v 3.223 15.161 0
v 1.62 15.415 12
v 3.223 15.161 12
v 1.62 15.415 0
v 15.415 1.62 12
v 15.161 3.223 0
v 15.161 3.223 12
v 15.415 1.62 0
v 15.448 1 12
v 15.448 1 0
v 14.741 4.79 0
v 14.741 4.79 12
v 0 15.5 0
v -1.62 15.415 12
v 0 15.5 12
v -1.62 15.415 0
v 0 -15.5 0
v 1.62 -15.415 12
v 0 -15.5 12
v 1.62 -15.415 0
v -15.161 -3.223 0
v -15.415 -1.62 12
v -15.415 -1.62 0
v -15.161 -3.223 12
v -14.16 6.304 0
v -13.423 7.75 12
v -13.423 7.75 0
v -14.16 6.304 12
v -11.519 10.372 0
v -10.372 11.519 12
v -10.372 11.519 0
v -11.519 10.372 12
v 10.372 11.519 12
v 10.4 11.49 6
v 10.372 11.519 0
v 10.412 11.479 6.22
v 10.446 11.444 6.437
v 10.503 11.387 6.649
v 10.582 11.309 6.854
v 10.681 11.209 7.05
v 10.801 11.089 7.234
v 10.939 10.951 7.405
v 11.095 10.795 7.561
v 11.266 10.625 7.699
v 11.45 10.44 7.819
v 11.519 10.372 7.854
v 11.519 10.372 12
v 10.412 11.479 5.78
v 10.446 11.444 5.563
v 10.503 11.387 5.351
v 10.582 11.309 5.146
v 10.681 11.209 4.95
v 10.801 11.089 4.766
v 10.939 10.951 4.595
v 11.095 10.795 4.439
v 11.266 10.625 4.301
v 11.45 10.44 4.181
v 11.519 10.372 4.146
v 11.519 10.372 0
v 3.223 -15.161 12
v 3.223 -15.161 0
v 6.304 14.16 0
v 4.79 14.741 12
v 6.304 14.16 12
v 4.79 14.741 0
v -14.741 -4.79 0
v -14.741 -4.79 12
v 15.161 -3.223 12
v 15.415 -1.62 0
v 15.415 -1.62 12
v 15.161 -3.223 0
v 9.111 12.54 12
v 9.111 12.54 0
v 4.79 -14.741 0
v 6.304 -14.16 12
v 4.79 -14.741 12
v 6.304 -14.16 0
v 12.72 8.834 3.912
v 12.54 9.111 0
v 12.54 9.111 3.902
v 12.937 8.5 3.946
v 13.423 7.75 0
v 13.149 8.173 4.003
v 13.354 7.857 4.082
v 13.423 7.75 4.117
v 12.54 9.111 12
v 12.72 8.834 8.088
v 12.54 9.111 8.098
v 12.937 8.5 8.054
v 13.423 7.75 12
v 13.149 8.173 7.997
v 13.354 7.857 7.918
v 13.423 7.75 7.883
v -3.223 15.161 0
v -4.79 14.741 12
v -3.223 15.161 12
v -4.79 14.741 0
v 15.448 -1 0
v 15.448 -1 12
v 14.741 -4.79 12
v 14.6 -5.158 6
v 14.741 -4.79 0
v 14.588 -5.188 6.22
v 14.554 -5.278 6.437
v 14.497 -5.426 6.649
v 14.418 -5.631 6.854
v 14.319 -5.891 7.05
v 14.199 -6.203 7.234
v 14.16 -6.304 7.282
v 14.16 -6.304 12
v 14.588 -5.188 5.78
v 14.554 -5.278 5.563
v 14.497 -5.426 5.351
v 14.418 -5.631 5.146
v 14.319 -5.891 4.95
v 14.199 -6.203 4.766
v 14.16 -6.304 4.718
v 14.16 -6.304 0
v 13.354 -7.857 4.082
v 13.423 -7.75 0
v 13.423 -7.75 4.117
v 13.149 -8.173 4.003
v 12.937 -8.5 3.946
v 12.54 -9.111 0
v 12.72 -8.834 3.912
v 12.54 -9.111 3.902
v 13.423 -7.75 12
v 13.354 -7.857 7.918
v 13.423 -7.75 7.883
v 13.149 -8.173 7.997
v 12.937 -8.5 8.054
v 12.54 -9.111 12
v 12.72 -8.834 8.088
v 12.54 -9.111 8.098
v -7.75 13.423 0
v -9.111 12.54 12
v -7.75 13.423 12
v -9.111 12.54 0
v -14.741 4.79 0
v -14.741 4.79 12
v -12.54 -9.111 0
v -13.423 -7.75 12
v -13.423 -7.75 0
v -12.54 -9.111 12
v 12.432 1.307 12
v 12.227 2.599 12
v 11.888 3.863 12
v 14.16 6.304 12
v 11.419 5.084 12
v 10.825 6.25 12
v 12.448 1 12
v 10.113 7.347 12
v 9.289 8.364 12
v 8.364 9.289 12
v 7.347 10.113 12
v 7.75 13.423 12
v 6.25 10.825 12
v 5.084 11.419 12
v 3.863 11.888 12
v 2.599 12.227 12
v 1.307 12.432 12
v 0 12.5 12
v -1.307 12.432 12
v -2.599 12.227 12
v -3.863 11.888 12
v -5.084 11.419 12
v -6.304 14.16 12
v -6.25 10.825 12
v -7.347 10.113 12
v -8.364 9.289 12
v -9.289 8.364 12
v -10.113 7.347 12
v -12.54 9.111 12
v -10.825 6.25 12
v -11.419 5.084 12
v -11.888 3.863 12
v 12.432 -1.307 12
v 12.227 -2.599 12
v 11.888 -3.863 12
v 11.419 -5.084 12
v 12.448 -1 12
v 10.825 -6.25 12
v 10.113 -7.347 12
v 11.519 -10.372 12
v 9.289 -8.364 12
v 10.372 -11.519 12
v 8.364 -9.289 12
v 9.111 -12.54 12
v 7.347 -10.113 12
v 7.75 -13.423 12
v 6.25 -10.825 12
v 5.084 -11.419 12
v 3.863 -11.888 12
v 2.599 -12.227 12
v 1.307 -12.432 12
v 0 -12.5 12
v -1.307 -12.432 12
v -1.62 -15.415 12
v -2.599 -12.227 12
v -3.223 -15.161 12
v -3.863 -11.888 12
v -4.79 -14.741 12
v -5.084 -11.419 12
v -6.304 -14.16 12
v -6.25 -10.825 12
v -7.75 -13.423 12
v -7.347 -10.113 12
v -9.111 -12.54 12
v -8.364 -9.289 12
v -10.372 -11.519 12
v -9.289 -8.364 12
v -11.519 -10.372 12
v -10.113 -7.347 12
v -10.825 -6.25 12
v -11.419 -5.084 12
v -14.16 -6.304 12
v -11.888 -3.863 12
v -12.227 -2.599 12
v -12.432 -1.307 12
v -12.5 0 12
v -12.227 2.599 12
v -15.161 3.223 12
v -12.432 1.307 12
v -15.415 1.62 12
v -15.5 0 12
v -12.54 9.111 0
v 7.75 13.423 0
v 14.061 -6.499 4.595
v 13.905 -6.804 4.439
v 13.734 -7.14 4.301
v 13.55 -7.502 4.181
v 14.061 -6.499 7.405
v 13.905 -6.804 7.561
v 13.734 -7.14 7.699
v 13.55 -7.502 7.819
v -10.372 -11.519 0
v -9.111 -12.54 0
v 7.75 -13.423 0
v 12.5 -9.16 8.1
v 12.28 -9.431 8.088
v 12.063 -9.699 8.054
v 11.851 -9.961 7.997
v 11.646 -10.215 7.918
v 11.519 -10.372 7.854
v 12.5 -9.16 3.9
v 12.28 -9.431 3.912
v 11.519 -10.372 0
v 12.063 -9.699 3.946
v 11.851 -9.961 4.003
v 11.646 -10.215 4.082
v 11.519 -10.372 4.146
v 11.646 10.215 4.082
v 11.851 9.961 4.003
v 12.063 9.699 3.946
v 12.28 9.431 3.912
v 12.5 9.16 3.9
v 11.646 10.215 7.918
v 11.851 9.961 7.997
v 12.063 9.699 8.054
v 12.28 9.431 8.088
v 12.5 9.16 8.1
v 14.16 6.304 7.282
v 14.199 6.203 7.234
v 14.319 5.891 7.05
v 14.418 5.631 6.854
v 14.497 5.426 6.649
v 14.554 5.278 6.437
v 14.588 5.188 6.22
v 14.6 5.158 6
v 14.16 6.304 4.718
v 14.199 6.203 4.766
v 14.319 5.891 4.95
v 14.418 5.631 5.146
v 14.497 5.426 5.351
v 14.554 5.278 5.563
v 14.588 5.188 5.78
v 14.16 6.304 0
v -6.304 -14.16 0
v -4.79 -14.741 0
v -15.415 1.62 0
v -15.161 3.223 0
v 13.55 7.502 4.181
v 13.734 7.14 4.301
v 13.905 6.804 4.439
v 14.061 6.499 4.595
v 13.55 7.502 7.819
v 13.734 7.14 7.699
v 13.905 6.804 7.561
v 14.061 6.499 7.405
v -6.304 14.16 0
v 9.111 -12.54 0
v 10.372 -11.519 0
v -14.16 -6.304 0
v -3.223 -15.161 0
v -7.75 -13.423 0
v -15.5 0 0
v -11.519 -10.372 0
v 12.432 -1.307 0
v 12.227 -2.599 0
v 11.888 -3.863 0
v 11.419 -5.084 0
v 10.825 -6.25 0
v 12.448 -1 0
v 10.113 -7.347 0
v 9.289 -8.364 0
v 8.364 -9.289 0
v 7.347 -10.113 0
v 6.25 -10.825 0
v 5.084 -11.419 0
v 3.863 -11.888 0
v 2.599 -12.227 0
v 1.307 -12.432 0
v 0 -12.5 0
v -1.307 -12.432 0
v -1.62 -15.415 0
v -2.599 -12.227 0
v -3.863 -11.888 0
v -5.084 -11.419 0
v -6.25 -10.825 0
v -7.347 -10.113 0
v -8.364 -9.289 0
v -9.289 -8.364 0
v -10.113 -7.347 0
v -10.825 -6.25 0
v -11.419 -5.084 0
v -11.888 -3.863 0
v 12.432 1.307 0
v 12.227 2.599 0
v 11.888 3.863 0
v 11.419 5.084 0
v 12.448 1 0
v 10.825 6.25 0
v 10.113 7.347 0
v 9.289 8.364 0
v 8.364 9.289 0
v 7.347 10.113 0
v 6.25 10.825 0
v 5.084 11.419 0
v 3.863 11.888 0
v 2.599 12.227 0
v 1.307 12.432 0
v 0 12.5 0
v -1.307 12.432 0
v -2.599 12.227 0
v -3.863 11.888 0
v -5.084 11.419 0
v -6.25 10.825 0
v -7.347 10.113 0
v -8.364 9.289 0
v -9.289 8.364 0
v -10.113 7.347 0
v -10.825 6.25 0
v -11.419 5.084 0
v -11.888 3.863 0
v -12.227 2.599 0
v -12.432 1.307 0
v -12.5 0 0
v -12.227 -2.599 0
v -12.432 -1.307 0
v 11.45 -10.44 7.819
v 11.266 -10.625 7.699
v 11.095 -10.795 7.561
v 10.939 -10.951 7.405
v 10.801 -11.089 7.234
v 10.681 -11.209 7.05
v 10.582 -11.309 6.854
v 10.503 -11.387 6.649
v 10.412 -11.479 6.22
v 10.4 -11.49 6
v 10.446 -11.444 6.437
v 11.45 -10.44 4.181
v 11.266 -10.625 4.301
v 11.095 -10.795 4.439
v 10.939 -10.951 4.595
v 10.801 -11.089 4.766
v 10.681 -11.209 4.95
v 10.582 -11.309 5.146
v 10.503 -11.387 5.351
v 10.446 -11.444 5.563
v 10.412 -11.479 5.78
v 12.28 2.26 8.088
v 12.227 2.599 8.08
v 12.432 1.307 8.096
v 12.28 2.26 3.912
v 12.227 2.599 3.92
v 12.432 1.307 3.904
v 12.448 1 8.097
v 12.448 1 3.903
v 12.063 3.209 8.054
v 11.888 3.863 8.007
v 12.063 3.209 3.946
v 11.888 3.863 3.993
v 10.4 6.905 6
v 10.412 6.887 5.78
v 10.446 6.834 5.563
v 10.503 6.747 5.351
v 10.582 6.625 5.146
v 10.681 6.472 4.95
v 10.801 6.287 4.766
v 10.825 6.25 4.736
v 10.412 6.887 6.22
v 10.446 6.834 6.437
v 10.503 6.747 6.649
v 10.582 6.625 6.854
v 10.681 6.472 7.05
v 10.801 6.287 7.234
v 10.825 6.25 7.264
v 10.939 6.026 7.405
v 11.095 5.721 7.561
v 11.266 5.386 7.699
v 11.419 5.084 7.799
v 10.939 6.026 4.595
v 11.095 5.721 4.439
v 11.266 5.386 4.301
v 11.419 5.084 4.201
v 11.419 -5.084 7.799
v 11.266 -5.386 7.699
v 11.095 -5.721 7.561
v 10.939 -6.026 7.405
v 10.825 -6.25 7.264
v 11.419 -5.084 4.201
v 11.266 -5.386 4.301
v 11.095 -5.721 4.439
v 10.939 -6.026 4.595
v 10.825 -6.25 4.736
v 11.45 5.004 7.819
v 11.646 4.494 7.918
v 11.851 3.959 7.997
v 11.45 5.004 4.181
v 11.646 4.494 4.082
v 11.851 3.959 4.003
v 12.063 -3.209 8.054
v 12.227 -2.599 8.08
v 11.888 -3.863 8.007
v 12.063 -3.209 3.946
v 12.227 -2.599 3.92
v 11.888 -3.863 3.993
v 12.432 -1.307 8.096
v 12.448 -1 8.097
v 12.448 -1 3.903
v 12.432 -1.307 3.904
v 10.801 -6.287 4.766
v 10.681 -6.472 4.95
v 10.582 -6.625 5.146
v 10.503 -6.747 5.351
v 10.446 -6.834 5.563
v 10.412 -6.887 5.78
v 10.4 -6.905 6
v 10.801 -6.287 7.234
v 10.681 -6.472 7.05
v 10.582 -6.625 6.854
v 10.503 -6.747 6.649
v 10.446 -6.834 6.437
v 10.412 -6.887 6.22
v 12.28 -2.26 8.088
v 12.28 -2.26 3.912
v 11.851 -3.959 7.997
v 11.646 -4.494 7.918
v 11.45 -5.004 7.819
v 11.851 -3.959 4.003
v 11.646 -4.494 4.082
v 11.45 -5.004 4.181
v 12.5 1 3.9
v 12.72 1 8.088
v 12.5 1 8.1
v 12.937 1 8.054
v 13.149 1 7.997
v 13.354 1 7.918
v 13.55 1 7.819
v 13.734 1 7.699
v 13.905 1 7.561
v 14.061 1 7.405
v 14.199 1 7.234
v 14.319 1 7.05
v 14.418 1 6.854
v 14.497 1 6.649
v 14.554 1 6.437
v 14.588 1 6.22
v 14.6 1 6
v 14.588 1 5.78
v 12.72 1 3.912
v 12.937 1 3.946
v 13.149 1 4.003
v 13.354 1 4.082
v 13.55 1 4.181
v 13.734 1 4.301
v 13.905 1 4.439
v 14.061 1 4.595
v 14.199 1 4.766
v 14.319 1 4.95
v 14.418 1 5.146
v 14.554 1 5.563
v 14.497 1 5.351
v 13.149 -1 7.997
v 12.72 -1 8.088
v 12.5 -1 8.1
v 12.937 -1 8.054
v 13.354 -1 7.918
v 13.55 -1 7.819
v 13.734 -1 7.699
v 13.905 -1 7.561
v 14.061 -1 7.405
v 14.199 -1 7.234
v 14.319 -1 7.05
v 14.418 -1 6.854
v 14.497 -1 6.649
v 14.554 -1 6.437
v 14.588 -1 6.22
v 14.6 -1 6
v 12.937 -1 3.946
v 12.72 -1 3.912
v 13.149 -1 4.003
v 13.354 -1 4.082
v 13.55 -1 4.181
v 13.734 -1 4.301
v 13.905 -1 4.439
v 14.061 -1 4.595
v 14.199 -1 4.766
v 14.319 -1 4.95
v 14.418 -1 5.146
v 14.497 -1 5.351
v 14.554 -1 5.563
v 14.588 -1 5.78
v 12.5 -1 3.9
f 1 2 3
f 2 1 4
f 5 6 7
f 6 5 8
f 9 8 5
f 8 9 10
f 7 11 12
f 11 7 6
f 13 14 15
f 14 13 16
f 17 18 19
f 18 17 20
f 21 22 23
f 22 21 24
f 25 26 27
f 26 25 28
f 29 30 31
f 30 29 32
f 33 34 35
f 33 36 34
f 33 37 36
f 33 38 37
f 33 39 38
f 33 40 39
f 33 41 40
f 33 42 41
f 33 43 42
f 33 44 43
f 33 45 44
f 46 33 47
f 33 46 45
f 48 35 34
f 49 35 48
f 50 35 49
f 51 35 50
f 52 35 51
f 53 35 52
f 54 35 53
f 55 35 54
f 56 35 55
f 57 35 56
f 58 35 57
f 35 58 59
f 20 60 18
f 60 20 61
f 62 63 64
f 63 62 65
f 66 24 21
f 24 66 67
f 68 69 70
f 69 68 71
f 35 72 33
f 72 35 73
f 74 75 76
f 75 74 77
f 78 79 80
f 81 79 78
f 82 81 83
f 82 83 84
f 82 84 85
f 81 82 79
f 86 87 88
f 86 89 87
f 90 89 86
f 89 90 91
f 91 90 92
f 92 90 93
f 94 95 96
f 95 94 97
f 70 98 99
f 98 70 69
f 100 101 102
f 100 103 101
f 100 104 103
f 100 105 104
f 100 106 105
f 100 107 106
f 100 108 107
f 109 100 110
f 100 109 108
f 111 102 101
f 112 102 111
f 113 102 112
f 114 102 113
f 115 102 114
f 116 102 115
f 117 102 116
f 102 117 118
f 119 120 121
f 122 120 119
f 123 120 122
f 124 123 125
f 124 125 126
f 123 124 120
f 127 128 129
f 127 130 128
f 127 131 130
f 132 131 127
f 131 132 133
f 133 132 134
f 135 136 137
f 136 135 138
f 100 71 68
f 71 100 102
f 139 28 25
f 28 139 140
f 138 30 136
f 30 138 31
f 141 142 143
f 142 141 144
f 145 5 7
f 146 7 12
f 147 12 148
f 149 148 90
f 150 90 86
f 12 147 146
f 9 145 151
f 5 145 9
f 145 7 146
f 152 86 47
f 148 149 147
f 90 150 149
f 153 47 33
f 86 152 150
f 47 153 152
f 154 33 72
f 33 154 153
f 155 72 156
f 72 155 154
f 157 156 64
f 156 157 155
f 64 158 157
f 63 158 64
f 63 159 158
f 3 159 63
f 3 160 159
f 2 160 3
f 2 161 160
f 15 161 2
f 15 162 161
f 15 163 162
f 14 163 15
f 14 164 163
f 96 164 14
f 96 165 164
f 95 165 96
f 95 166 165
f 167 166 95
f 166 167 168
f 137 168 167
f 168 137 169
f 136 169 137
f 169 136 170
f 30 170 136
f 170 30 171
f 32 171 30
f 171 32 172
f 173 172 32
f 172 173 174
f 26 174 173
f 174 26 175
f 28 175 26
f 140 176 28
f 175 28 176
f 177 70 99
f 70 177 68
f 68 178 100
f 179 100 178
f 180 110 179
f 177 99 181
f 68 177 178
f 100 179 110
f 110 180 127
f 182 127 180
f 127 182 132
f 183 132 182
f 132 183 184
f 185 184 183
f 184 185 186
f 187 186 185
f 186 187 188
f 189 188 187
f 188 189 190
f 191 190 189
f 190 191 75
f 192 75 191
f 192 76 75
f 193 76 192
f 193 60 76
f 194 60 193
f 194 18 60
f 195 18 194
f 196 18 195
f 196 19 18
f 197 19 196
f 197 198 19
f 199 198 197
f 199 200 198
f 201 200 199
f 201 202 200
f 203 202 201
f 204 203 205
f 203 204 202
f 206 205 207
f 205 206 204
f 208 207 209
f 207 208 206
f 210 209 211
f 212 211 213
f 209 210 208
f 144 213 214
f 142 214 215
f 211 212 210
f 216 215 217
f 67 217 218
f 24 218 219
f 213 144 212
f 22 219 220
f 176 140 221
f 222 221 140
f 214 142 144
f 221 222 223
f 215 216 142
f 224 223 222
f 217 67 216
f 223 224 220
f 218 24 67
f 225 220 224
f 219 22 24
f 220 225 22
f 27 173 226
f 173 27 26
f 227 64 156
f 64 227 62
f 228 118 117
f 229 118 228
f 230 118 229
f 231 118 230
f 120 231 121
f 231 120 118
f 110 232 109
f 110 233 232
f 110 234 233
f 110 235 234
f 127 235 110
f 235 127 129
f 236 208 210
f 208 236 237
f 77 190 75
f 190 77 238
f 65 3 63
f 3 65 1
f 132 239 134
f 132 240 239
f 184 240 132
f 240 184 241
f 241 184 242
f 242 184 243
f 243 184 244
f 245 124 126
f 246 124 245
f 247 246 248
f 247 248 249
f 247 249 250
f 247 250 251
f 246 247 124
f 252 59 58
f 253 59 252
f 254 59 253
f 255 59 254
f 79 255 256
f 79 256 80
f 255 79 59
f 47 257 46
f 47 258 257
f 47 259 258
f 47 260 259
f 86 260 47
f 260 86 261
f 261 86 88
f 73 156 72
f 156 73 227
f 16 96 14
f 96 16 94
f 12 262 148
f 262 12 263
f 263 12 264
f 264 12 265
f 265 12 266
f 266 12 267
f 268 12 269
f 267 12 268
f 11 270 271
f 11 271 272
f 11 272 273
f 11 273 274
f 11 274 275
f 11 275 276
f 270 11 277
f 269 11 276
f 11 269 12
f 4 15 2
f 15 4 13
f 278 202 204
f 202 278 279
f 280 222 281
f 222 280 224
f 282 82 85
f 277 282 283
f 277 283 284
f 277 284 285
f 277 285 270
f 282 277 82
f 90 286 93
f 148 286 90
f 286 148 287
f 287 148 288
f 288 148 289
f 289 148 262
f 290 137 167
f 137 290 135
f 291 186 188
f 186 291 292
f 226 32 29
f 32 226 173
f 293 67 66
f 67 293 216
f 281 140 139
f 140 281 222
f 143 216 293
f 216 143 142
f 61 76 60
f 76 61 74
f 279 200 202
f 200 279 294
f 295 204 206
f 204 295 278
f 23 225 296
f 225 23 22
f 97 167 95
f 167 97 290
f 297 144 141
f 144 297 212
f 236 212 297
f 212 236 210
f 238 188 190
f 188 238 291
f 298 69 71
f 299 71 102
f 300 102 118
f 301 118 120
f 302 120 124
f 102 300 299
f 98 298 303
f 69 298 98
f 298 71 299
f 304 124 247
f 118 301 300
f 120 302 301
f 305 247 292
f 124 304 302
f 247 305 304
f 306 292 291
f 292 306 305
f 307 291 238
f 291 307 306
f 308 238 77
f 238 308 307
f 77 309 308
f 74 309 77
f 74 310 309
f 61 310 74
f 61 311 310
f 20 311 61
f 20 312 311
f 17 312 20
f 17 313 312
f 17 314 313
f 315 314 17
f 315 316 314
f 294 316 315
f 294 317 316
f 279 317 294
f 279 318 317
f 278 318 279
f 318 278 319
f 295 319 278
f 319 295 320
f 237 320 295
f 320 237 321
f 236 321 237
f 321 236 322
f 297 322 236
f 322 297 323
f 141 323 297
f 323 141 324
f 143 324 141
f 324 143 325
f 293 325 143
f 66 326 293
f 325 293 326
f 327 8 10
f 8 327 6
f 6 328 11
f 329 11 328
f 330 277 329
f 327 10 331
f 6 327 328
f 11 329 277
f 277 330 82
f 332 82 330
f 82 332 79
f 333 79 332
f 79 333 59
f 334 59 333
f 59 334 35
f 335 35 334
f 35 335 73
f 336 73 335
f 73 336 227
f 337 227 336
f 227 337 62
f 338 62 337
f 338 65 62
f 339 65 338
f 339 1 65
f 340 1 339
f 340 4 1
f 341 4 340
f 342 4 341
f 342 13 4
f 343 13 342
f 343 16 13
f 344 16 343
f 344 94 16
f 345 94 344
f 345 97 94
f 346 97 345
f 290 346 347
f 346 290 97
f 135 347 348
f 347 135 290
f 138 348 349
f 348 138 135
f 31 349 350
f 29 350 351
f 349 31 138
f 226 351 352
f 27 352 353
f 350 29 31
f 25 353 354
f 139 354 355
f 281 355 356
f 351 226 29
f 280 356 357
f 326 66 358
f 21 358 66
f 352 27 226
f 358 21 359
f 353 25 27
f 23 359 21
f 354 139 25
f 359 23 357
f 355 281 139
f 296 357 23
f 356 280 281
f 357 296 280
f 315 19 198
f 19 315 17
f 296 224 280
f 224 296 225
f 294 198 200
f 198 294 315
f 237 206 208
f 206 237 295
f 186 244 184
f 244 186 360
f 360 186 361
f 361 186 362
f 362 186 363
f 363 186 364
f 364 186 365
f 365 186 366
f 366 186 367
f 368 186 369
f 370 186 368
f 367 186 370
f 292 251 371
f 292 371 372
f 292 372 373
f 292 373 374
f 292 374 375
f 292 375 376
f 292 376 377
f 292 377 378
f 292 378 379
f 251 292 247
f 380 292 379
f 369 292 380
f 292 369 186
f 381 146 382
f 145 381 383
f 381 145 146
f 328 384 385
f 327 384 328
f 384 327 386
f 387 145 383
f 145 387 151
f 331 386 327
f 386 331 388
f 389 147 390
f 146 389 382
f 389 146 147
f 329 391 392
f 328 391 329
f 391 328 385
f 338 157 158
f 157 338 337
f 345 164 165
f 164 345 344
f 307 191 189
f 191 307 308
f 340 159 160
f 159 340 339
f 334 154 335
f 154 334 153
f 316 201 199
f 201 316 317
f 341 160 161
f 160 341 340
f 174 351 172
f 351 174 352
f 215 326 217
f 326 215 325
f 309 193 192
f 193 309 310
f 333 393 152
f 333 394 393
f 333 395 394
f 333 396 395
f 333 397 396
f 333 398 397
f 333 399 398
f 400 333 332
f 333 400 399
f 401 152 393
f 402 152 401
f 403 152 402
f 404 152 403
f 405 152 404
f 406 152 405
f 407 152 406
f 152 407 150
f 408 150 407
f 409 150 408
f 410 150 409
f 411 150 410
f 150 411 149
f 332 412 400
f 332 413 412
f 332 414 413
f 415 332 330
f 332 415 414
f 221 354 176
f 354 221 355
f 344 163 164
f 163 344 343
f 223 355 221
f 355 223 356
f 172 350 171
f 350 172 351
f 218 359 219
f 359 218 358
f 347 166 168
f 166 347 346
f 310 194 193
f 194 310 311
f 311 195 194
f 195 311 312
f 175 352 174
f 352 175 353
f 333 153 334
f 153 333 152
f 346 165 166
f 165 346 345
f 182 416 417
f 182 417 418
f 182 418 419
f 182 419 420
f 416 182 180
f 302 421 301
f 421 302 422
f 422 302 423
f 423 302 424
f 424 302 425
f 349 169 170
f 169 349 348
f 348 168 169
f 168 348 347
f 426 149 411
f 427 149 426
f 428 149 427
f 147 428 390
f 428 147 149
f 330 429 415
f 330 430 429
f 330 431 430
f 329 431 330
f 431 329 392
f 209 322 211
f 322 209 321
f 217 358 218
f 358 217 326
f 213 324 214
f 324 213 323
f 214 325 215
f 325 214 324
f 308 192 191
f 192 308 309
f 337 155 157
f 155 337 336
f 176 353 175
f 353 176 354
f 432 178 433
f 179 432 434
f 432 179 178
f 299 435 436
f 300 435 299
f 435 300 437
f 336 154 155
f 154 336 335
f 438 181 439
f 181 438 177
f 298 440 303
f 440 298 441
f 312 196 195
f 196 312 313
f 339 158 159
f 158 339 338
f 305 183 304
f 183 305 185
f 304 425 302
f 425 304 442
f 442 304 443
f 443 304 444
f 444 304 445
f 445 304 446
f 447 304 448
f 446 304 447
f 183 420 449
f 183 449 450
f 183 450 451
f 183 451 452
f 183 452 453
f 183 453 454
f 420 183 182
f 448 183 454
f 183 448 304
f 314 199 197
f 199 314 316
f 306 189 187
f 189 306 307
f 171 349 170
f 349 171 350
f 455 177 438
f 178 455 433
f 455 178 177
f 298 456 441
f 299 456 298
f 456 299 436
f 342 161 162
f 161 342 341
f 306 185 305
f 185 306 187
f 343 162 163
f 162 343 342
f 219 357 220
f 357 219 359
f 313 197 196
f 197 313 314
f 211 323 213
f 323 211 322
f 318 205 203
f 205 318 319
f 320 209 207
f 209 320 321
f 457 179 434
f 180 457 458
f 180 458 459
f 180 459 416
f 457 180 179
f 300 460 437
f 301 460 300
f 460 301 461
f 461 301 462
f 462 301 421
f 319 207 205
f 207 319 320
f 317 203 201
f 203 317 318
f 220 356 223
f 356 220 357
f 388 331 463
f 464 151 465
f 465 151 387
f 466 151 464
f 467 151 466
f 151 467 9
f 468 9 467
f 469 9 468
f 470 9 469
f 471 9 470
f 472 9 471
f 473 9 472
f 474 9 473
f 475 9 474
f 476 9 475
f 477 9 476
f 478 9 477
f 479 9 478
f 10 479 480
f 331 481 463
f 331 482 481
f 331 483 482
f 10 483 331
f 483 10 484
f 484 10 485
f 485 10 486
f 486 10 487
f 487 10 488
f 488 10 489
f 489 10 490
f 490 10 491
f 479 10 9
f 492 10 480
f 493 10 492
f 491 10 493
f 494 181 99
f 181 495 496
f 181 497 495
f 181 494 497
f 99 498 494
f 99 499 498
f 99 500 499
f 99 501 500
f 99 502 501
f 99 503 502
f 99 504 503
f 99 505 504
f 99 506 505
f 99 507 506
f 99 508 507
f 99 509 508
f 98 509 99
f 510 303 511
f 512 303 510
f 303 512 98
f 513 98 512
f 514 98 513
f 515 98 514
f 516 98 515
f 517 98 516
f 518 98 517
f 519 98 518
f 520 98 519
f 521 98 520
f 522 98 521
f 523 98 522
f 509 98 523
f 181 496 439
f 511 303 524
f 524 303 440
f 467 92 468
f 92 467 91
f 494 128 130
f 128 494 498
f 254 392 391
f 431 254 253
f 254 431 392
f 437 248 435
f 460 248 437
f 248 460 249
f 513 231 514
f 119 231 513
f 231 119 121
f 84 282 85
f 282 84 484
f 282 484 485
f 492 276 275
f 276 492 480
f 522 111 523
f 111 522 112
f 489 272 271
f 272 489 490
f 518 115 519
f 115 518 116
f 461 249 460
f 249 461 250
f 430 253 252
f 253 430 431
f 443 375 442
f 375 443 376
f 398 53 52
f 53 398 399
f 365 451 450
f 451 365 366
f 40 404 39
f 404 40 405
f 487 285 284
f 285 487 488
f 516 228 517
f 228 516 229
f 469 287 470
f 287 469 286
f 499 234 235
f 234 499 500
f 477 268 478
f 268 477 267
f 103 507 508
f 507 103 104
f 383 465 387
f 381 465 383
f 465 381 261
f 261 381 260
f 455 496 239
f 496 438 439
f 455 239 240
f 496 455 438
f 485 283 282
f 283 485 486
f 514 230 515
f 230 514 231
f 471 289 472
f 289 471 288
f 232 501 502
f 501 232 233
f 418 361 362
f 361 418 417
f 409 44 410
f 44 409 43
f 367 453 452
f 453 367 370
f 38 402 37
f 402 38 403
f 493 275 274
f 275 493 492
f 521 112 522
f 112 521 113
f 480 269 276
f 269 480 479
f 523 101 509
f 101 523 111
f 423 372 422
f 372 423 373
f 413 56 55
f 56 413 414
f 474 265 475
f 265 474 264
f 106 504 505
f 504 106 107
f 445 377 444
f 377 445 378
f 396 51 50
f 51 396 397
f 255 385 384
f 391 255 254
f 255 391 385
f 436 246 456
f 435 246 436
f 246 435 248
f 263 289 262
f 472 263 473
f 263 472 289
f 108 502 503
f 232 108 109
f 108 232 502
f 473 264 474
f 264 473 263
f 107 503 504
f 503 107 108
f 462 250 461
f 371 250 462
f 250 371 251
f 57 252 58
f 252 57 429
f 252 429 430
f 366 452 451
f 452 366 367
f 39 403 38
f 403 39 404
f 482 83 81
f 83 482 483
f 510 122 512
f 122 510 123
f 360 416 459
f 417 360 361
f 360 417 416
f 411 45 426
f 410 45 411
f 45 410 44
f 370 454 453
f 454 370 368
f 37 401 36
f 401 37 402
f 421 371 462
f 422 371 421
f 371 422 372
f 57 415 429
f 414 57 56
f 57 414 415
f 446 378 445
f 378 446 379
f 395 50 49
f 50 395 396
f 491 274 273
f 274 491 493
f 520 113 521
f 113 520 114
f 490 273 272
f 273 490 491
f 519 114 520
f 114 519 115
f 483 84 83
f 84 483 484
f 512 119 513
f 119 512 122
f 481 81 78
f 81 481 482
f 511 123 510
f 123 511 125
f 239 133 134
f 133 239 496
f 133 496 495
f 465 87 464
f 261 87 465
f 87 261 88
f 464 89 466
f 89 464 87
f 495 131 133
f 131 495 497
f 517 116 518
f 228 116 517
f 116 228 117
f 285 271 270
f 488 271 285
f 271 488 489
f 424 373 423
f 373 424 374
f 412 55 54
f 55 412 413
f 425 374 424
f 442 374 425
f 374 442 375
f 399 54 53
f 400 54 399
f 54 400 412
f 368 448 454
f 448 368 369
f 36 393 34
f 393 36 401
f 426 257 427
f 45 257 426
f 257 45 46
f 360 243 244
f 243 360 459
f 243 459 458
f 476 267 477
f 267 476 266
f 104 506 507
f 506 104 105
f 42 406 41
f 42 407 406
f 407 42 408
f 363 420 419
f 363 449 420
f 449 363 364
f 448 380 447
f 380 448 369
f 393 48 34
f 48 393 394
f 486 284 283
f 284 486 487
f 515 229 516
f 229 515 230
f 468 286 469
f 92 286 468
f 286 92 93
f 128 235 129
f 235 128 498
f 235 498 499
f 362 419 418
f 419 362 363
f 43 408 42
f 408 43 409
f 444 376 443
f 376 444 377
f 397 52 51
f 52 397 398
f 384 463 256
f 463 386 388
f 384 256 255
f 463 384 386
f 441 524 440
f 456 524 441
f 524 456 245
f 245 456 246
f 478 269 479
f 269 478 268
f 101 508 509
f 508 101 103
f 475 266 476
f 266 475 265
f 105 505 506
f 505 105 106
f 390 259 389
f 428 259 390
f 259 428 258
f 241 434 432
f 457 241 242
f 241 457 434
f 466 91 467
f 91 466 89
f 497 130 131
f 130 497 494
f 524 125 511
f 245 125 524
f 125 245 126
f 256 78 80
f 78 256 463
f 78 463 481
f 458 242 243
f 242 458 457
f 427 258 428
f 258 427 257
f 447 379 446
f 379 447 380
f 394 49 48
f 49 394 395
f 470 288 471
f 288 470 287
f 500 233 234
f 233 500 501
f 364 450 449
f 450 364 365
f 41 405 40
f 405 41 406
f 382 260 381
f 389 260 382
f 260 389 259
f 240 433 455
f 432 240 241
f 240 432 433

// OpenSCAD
// C-style pipe clamp.
$fn = 60;
eps = 0.02;
pipe_d = 25;
wall = 3;
outer_d = pipe_d + 2 * wall;
width = 12;
slit = 2;
difference() {
    cylinder(d=outer_d,h=width);
    translate([0,0,-eps]) cylinder(d=pipe_d,h=width+2*eps);
    translate([0,-slit/2,-eps]) cube([outer_d/2+eps,slit,width+2*eps]);
    translate([outer_d/2-3,-outer_d/2-eps,width/2]) rotate([-90,0,0]) cylinder(d=4.2,h=outer_d+2*eps);
}
